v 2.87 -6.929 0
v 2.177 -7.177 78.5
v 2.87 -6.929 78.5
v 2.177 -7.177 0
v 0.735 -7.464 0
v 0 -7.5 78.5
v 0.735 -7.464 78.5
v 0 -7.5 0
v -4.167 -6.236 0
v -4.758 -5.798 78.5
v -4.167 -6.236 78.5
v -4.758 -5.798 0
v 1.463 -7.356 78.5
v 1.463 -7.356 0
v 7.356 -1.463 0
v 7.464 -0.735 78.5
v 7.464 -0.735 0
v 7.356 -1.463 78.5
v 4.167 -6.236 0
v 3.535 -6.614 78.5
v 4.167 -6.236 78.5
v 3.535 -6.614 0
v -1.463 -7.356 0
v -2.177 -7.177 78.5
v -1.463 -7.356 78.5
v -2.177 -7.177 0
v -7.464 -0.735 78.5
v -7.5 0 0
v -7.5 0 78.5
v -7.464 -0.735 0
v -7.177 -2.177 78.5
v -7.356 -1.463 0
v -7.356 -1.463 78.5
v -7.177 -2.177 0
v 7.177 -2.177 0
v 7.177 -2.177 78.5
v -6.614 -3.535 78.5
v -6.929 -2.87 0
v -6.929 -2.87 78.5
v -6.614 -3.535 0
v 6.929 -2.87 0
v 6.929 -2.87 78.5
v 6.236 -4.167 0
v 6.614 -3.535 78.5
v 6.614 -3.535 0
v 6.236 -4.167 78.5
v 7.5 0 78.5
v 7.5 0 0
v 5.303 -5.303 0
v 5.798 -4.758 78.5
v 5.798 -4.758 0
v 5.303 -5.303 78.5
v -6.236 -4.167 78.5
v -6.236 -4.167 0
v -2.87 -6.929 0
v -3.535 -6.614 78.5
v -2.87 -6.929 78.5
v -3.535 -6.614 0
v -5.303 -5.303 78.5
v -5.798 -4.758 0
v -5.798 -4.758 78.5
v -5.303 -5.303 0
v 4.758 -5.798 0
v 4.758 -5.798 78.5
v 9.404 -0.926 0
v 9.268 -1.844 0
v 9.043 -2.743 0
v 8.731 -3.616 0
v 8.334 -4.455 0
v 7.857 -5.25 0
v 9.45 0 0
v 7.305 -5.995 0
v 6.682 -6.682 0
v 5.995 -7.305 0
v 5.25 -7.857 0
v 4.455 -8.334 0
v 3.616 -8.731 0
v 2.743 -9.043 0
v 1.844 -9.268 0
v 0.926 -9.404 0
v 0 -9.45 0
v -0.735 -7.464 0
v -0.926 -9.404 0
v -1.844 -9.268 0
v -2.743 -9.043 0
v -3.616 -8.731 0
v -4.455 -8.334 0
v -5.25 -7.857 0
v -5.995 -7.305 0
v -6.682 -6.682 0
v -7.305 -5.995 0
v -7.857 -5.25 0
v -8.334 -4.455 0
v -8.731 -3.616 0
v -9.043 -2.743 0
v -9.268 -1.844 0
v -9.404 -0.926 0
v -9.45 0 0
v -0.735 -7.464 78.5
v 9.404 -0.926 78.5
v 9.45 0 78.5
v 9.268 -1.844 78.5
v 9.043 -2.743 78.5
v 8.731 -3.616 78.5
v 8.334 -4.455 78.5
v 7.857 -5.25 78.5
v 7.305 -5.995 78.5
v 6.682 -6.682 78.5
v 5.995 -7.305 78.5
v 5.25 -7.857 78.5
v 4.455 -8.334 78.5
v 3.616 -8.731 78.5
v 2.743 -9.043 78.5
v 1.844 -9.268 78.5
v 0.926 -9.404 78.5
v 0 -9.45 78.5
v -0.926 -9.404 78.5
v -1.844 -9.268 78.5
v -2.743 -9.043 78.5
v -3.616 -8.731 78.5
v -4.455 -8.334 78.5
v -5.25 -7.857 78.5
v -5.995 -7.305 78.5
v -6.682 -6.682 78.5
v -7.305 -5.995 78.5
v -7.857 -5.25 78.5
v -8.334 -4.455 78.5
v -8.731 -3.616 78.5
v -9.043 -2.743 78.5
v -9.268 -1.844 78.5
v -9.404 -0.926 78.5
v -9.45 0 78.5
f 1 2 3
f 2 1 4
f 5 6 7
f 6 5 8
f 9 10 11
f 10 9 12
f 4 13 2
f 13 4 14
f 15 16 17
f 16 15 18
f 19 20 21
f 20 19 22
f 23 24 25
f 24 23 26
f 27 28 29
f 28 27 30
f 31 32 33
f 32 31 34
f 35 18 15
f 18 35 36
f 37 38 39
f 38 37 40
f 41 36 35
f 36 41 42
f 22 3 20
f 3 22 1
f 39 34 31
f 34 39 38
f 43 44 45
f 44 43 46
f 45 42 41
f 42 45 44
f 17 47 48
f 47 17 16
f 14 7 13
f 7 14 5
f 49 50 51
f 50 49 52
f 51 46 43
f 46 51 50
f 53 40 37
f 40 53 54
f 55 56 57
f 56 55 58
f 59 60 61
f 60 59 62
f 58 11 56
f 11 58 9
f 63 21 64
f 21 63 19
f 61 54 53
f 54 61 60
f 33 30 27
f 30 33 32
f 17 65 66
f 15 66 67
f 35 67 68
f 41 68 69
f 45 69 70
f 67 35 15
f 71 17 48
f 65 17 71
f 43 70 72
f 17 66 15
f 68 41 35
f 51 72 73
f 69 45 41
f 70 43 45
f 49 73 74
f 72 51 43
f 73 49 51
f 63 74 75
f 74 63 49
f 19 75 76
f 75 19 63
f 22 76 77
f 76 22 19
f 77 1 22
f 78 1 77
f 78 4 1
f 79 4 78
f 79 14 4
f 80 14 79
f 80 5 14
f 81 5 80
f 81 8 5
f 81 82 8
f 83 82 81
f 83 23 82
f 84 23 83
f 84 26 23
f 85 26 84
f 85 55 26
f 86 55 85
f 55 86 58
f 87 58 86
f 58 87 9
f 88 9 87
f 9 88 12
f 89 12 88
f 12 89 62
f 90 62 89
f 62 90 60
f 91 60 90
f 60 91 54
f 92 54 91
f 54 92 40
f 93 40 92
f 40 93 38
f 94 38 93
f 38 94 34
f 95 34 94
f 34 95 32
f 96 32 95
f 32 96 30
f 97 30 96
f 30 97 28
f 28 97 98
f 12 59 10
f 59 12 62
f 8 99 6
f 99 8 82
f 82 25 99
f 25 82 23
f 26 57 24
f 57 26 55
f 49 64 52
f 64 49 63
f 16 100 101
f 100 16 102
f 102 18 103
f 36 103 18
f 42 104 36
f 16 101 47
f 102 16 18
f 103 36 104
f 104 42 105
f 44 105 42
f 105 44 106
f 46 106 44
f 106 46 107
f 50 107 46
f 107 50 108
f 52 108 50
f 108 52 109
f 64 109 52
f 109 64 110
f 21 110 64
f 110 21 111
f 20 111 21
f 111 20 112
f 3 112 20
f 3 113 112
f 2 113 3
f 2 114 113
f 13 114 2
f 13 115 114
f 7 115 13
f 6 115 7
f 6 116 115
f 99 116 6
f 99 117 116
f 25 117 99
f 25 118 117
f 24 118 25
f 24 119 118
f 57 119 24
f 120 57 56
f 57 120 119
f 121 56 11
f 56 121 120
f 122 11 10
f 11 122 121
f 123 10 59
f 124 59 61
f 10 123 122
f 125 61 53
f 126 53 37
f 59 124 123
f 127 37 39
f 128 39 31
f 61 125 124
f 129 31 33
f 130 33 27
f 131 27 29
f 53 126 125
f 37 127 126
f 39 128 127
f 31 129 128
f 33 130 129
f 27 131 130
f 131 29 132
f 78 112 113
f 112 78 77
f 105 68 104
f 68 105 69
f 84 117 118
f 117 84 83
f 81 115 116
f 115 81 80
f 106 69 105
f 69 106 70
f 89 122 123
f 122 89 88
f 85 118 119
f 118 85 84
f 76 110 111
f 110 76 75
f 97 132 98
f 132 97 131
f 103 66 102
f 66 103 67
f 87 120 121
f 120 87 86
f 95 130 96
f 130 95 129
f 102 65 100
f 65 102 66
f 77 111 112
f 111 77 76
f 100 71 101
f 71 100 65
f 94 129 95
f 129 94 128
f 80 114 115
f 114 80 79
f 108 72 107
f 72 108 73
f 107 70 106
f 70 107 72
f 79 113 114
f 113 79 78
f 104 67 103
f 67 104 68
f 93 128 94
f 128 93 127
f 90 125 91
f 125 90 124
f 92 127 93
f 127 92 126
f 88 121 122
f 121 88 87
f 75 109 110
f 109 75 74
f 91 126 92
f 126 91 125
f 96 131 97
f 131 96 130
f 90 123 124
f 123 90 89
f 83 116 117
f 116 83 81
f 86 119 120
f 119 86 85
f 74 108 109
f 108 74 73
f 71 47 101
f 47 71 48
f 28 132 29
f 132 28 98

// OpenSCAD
module split_cylindrical_sleeve() {
    difference() {
        // Outer cylinder
        cylinder(h=78.5, r=9.45, $fn=64);
        
        // Inner bore with steps
        union() {
            // Main inner bore
            cylinder(h=78.5, r=7.5, $fn=64);
            
            // Steps/notches near one end
            translate([0, 0, 70])
                cylinder(h=8.5, r=6.5, $fn=64);
            translate([0, 0, 74])
                cylinder(h=4.5, r=5.5, $fn=64);
        }
        
        // Axial gap
        translate([-9.45, 0, 0])
            cube([19.5, 18.9, 78.5]);
    }
}

split_cylindrical_sleeve();
